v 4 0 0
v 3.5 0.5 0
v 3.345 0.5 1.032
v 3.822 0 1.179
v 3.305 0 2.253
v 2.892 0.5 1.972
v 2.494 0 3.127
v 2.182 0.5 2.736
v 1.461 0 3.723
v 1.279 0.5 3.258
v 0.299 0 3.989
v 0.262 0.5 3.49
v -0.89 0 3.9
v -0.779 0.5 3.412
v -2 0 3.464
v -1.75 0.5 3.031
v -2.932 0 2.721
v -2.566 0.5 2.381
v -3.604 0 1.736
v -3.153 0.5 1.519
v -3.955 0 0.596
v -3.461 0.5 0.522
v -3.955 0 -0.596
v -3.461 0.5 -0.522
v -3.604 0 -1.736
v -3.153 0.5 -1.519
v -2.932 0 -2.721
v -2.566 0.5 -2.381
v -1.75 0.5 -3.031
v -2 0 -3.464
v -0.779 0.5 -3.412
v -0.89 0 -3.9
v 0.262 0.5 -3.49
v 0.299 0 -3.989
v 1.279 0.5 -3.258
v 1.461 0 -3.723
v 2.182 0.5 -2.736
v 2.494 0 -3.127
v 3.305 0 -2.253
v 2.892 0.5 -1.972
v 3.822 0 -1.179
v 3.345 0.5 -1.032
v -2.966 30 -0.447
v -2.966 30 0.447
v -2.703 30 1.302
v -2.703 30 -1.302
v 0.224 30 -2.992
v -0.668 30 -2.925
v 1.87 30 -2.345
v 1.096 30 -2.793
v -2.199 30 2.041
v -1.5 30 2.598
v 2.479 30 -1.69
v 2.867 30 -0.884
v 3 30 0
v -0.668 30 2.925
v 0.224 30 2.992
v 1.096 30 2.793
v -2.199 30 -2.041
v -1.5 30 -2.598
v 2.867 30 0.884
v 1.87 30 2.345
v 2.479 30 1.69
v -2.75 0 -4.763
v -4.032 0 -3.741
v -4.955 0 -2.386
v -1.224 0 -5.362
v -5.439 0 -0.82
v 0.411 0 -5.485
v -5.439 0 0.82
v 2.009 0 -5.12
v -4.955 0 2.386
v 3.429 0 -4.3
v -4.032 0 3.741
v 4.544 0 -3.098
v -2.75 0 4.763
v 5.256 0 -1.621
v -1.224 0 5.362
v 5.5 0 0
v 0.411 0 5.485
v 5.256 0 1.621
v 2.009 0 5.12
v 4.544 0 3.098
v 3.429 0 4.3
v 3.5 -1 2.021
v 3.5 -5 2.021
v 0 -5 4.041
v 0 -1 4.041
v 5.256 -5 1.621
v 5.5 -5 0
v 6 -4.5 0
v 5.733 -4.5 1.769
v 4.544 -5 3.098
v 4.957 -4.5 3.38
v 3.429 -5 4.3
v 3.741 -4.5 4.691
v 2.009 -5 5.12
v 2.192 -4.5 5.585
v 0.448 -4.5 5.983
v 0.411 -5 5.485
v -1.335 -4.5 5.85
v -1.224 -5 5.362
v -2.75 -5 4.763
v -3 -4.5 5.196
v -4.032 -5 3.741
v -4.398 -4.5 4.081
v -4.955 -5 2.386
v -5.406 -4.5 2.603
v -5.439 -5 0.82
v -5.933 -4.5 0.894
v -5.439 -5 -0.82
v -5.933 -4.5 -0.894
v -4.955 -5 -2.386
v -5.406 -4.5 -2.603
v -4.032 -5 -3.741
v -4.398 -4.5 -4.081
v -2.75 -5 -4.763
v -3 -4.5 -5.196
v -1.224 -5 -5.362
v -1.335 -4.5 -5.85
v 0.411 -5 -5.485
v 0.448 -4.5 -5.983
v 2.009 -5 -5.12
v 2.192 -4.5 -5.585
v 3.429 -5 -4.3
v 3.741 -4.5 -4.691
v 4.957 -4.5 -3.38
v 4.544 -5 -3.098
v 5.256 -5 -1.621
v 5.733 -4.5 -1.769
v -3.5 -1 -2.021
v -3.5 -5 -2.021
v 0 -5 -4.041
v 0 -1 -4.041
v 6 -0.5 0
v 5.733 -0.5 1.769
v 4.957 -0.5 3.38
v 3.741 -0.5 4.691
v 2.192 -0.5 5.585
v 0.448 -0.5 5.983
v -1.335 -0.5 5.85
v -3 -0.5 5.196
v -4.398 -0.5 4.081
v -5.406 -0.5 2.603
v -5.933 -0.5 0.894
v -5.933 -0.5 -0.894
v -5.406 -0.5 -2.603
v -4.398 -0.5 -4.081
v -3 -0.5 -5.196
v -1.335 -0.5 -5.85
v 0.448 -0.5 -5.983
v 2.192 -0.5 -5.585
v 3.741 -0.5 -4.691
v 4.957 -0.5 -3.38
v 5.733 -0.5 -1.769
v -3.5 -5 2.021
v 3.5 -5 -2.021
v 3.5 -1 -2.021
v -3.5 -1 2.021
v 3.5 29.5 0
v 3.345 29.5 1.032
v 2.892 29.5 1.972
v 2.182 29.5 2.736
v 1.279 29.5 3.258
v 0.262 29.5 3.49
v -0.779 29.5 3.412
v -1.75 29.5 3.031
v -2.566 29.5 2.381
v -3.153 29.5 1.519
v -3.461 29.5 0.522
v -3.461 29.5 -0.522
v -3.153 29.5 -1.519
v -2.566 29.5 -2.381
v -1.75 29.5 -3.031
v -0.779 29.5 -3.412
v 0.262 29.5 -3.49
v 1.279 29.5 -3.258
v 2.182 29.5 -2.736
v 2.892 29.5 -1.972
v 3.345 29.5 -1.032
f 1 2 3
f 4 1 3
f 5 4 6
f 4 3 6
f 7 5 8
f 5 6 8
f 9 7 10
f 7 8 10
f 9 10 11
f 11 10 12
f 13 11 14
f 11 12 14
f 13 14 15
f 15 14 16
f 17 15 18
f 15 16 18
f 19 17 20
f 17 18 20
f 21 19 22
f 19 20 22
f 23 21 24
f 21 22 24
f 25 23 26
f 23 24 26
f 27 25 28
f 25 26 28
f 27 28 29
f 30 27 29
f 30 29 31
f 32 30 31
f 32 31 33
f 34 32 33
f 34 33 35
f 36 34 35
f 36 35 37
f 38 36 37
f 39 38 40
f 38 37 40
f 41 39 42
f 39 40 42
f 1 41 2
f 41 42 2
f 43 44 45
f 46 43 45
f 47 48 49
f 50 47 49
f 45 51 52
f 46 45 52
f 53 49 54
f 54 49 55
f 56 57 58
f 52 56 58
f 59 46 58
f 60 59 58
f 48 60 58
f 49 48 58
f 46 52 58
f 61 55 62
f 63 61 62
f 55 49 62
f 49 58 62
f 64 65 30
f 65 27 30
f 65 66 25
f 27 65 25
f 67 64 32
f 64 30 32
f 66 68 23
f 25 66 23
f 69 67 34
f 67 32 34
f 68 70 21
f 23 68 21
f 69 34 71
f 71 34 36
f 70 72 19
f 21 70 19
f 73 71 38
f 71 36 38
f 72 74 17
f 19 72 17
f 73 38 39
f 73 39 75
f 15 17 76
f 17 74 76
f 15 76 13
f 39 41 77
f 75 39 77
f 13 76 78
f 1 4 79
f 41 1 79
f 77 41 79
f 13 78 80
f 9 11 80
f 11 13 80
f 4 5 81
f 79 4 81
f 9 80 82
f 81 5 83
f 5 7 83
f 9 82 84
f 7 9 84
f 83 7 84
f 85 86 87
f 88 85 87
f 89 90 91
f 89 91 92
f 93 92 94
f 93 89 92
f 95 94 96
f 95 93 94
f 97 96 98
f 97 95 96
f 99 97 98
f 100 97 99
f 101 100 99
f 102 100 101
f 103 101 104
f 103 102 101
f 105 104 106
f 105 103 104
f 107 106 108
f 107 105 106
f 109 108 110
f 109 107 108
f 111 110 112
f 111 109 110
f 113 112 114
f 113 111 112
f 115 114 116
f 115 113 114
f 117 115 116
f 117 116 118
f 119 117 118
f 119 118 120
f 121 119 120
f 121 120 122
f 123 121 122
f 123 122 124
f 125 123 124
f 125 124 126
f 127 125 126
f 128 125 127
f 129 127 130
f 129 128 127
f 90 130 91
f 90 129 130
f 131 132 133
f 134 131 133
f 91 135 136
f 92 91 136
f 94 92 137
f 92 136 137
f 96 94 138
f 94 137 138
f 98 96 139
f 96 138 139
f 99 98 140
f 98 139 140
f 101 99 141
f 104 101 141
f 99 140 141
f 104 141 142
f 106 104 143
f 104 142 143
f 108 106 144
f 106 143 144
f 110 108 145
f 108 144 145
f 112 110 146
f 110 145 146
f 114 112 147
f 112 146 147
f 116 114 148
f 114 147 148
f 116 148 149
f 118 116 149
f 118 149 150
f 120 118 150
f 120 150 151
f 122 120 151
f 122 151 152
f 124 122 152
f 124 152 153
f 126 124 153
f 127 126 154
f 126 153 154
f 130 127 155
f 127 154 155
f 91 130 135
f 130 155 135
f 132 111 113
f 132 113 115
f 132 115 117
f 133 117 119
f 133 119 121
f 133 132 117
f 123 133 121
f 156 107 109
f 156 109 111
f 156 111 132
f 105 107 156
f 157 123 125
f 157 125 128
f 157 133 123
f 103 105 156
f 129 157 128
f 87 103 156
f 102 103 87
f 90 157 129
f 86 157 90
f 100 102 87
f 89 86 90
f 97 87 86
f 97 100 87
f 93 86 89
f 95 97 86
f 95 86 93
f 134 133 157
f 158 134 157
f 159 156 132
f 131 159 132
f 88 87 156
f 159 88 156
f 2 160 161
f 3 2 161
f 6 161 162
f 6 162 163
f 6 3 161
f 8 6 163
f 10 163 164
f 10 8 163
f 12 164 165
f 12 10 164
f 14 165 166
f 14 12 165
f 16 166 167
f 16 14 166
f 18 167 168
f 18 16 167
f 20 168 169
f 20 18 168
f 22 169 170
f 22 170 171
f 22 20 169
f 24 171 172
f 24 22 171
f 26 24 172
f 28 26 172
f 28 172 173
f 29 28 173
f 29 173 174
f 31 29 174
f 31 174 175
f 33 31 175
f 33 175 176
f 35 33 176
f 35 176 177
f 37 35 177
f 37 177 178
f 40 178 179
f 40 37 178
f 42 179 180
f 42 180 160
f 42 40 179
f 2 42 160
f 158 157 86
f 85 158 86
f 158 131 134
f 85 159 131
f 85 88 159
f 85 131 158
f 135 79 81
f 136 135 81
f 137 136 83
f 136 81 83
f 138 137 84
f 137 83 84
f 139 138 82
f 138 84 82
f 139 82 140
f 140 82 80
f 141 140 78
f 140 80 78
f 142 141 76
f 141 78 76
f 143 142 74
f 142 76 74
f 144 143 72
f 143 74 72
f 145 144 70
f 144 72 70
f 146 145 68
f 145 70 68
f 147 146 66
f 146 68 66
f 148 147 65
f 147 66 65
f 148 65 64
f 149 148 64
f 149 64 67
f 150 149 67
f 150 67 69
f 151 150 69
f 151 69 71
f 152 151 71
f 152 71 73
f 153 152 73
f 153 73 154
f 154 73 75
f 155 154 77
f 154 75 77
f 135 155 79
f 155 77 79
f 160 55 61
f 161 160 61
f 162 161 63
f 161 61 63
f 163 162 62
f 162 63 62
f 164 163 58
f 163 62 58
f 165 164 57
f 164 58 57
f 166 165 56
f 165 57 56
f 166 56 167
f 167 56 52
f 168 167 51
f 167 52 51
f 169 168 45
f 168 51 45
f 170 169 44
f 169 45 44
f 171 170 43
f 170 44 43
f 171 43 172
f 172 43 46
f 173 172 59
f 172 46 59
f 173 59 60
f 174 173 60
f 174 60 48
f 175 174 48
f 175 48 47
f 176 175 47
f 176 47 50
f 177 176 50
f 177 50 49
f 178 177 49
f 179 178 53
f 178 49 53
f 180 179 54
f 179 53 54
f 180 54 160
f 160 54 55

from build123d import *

# Parameters (mm, degrees)
F0_R     = 3.5
F1_DEPTH = 30
F2_R     = 6
F3_DEPTH = 5
F4_SIZE  = 0.5
F6_DEPTH = 4


with BuildPart() as f1:
    # F0 (on Front) → F1 (new body)
    with BuildSketch(Plane.XZ):
        Circle(F0_R)
    extrude(amount=-F1_DEPTH)

    # F2 (on face) → F3 (join)
    with BuildSketch(Plane.XZ):
        Circle(F2_R)
    extrude(amount=F3_DEPTH)

    # F4
    f4_edges = [f1.edges().sort_by_distance(p)[0] for p in [
        (-6, -5, 0),
        (-6, 0, 0),
        (-3.5, 30, 0),
        (-3.5, 0, 0),
    ]]
    chamfer(f4_edges, length=F4_SIZE)

    # F5 (on face) → F6 (cut)
    with BuildSketch(Plane.XZ.offset(5)):
        Polygon((-3.5, 2.020726), (-3.5, -2.020726), (0, -4.041452), (3.5, -2.020726), (3.5, 2.020726), (0, 4.041452), align=None)
    extrude(amount=-F6_DEPTH, mode=Mode.SUBTRACT)


solid = f1.part
